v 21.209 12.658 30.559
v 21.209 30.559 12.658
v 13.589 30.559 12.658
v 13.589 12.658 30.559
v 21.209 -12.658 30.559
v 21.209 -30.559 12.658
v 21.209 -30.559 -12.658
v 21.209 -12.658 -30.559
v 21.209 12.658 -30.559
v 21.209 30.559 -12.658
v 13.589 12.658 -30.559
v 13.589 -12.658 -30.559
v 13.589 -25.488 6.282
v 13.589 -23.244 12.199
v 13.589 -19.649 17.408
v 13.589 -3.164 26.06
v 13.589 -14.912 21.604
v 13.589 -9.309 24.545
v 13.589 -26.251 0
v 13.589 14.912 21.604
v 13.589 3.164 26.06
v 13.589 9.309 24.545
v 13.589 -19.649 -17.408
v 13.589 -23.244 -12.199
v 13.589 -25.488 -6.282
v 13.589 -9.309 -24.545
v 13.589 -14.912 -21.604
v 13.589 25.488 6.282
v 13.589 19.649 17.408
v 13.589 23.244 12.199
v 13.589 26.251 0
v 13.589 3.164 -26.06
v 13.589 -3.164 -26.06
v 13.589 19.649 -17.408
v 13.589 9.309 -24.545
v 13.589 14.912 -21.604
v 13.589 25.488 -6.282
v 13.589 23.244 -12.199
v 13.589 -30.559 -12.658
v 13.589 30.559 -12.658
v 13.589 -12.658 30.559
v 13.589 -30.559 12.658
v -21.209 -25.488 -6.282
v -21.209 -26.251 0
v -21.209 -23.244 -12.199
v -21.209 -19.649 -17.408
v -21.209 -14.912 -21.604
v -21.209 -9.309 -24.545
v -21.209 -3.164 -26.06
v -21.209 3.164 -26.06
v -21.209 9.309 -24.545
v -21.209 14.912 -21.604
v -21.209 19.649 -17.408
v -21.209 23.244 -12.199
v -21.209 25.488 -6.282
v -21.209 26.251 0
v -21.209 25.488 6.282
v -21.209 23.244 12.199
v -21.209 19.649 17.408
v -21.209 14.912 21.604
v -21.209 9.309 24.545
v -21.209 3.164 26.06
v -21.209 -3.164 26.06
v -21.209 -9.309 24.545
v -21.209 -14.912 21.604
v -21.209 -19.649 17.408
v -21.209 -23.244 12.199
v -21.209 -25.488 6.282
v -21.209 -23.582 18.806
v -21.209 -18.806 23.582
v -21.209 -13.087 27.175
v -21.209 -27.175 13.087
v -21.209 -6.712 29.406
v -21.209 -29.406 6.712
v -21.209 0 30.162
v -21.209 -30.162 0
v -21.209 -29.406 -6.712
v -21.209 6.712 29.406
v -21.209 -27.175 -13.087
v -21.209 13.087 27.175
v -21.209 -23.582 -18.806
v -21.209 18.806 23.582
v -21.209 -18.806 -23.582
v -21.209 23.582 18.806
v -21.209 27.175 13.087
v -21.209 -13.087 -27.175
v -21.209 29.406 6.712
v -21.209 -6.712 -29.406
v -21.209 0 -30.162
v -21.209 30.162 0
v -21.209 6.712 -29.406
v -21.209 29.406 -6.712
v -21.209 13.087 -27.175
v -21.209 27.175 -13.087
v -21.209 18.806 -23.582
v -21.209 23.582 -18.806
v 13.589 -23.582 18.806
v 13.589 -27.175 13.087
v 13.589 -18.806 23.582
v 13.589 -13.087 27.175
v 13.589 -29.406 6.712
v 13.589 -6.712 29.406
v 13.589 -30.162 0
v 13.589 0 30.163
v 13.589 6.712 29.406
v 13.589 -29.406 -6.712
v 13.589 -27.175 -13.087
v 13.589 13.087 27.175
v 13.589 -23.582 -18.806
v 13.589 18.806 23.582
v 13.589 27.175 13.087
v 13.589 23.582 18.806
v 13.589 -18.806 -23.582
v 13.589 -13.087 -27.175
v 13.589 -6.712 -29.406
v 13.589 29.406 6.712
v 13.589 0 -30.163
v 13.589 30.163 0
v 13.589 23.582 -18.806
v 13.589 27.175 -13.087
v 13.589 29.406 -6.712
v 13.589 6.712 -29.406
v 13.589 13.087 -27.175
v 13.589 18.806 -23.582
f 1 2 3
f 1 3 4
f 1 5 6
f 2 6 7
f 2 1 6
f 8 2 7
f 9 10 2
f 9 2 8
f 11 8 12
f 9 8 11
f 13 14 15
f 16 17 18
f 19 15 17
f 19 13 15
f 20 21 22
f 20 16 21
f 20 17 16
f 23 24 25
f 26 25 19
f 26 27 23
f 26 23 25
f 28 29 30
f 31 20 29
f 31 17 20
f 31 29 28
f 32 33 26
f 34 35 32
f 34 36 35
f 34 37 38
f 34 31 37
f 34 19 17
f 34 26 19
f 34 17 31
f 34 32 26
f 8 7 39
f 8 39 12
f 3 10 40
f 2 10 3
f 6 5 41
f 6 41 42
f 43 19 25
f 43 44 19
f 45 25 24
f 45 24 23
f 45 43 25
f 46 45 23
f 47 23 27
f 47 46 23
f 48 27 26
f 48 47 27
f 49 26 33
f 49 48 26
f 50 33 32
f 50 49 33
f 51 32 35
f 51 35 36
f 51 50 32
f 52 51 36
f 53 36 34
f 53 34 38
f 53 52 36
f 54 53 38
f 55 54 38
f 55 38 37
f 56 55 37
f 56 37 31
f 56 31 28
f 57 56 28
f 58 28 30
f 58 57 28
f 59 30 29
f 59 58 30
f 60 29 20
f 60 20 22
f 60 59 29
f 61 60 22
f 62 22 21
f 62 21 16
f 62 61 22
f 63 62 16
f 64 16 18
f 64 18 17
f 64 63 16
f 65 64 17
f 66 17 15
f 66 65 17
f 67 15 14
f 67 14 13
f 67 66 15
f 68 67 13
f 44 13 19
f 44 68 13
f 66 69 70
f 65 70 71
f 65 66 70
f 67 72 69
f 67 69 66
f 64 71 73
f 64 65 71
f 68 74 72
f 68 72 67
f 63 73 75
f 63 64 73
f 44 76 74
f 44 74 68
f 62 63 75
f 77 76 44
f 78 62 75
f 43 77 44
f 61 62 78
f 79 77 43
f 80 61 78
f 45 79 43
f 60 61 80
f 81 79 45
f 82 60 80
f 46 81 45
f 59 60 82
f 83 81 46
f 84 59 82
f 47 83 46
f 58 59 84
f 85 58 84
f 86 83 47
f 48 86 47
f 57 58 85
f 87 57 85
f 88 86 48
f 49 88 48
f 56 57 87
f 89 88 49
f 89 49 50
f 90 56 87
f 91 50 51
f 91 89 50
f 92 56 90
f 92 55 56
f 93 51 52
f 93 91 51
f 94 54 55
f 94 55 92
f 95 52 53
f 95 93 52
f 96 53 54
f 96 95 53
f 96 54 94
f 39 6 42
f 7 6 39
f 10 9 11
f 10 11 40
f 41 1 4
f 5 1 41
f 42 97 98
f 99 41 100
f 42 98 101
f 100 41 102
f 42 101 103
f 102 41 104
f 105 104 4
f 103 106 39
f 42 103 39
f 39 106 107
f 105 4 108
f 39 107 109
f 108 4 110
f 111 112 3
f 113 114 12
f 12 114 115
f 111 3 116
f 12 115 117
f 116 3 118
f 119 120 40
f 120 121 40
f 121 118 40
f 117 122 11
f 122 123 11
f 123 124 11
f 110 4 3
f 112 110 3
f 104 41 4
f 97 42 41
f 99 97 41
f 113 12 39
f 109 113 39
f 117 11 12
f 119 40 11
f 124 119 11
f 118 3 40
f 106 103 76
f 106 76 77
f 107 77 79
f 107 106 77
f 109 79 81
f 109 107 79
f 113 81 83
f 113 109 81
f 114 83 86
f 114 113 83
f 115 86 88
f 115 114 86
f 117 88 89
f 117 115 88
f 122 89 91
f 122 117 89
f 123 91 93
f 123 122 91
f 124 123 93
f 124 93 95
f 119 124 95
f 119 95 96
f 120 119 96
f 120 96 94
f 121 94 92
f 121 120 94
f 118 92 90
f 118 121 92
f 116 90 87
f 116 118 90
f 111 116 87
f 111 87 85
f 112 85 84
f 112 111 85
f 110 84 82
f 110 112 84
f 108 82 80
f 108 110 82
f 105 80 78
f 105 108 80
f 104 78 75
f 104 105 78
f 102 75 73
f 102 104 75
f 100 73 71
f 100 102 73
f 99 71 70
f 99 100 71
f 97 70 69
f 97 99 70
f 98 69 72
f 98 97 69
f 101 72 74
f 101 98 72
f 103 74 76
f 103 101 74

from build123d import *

# Parameters (mm, degrees)
SKETCH2_R           = 30.1625
BOSS_EXTRUDE1_DEPTH = 7.62


with BuildPart() as part:
    # Sketch1 → Revolve1 (revolve)
    with BuildSketch(Plane.XY):
        Polygon((-21.209, -30.1625), (21.209, -30.1625), (21.209, 0), (13.589, 0), (13.589, -26.2509), (-21.209, -26.2509), align=None)
    revolve(axis=Axis((-21.209, 0, 0), (1, 0, 0)))

    # Sketch2 → Boss-Extrude1 (add)
    with BuildSketch(Plane(origin=(21.209, 0, 0), x_dir=(0, 0, -1), z_dir=(1, 0, 0))):
        Polygon((-12.658107583, 30.559375), (-30.559375, 12.658107583), (-30.559375, -12.658107583), (-12.658107583, -30.559375), (12.658107583, -30.559375), (30.559375, -12.658107583), (30.559375, 12.658107583), (12.658107583, 30.559375), align=None)
        Circle(SKETCH2_R, mode=Mode.SUBTRACT)
    extrude(amount=-BOSS_EXTRUDE1_DEPTH)


solid = part.part
